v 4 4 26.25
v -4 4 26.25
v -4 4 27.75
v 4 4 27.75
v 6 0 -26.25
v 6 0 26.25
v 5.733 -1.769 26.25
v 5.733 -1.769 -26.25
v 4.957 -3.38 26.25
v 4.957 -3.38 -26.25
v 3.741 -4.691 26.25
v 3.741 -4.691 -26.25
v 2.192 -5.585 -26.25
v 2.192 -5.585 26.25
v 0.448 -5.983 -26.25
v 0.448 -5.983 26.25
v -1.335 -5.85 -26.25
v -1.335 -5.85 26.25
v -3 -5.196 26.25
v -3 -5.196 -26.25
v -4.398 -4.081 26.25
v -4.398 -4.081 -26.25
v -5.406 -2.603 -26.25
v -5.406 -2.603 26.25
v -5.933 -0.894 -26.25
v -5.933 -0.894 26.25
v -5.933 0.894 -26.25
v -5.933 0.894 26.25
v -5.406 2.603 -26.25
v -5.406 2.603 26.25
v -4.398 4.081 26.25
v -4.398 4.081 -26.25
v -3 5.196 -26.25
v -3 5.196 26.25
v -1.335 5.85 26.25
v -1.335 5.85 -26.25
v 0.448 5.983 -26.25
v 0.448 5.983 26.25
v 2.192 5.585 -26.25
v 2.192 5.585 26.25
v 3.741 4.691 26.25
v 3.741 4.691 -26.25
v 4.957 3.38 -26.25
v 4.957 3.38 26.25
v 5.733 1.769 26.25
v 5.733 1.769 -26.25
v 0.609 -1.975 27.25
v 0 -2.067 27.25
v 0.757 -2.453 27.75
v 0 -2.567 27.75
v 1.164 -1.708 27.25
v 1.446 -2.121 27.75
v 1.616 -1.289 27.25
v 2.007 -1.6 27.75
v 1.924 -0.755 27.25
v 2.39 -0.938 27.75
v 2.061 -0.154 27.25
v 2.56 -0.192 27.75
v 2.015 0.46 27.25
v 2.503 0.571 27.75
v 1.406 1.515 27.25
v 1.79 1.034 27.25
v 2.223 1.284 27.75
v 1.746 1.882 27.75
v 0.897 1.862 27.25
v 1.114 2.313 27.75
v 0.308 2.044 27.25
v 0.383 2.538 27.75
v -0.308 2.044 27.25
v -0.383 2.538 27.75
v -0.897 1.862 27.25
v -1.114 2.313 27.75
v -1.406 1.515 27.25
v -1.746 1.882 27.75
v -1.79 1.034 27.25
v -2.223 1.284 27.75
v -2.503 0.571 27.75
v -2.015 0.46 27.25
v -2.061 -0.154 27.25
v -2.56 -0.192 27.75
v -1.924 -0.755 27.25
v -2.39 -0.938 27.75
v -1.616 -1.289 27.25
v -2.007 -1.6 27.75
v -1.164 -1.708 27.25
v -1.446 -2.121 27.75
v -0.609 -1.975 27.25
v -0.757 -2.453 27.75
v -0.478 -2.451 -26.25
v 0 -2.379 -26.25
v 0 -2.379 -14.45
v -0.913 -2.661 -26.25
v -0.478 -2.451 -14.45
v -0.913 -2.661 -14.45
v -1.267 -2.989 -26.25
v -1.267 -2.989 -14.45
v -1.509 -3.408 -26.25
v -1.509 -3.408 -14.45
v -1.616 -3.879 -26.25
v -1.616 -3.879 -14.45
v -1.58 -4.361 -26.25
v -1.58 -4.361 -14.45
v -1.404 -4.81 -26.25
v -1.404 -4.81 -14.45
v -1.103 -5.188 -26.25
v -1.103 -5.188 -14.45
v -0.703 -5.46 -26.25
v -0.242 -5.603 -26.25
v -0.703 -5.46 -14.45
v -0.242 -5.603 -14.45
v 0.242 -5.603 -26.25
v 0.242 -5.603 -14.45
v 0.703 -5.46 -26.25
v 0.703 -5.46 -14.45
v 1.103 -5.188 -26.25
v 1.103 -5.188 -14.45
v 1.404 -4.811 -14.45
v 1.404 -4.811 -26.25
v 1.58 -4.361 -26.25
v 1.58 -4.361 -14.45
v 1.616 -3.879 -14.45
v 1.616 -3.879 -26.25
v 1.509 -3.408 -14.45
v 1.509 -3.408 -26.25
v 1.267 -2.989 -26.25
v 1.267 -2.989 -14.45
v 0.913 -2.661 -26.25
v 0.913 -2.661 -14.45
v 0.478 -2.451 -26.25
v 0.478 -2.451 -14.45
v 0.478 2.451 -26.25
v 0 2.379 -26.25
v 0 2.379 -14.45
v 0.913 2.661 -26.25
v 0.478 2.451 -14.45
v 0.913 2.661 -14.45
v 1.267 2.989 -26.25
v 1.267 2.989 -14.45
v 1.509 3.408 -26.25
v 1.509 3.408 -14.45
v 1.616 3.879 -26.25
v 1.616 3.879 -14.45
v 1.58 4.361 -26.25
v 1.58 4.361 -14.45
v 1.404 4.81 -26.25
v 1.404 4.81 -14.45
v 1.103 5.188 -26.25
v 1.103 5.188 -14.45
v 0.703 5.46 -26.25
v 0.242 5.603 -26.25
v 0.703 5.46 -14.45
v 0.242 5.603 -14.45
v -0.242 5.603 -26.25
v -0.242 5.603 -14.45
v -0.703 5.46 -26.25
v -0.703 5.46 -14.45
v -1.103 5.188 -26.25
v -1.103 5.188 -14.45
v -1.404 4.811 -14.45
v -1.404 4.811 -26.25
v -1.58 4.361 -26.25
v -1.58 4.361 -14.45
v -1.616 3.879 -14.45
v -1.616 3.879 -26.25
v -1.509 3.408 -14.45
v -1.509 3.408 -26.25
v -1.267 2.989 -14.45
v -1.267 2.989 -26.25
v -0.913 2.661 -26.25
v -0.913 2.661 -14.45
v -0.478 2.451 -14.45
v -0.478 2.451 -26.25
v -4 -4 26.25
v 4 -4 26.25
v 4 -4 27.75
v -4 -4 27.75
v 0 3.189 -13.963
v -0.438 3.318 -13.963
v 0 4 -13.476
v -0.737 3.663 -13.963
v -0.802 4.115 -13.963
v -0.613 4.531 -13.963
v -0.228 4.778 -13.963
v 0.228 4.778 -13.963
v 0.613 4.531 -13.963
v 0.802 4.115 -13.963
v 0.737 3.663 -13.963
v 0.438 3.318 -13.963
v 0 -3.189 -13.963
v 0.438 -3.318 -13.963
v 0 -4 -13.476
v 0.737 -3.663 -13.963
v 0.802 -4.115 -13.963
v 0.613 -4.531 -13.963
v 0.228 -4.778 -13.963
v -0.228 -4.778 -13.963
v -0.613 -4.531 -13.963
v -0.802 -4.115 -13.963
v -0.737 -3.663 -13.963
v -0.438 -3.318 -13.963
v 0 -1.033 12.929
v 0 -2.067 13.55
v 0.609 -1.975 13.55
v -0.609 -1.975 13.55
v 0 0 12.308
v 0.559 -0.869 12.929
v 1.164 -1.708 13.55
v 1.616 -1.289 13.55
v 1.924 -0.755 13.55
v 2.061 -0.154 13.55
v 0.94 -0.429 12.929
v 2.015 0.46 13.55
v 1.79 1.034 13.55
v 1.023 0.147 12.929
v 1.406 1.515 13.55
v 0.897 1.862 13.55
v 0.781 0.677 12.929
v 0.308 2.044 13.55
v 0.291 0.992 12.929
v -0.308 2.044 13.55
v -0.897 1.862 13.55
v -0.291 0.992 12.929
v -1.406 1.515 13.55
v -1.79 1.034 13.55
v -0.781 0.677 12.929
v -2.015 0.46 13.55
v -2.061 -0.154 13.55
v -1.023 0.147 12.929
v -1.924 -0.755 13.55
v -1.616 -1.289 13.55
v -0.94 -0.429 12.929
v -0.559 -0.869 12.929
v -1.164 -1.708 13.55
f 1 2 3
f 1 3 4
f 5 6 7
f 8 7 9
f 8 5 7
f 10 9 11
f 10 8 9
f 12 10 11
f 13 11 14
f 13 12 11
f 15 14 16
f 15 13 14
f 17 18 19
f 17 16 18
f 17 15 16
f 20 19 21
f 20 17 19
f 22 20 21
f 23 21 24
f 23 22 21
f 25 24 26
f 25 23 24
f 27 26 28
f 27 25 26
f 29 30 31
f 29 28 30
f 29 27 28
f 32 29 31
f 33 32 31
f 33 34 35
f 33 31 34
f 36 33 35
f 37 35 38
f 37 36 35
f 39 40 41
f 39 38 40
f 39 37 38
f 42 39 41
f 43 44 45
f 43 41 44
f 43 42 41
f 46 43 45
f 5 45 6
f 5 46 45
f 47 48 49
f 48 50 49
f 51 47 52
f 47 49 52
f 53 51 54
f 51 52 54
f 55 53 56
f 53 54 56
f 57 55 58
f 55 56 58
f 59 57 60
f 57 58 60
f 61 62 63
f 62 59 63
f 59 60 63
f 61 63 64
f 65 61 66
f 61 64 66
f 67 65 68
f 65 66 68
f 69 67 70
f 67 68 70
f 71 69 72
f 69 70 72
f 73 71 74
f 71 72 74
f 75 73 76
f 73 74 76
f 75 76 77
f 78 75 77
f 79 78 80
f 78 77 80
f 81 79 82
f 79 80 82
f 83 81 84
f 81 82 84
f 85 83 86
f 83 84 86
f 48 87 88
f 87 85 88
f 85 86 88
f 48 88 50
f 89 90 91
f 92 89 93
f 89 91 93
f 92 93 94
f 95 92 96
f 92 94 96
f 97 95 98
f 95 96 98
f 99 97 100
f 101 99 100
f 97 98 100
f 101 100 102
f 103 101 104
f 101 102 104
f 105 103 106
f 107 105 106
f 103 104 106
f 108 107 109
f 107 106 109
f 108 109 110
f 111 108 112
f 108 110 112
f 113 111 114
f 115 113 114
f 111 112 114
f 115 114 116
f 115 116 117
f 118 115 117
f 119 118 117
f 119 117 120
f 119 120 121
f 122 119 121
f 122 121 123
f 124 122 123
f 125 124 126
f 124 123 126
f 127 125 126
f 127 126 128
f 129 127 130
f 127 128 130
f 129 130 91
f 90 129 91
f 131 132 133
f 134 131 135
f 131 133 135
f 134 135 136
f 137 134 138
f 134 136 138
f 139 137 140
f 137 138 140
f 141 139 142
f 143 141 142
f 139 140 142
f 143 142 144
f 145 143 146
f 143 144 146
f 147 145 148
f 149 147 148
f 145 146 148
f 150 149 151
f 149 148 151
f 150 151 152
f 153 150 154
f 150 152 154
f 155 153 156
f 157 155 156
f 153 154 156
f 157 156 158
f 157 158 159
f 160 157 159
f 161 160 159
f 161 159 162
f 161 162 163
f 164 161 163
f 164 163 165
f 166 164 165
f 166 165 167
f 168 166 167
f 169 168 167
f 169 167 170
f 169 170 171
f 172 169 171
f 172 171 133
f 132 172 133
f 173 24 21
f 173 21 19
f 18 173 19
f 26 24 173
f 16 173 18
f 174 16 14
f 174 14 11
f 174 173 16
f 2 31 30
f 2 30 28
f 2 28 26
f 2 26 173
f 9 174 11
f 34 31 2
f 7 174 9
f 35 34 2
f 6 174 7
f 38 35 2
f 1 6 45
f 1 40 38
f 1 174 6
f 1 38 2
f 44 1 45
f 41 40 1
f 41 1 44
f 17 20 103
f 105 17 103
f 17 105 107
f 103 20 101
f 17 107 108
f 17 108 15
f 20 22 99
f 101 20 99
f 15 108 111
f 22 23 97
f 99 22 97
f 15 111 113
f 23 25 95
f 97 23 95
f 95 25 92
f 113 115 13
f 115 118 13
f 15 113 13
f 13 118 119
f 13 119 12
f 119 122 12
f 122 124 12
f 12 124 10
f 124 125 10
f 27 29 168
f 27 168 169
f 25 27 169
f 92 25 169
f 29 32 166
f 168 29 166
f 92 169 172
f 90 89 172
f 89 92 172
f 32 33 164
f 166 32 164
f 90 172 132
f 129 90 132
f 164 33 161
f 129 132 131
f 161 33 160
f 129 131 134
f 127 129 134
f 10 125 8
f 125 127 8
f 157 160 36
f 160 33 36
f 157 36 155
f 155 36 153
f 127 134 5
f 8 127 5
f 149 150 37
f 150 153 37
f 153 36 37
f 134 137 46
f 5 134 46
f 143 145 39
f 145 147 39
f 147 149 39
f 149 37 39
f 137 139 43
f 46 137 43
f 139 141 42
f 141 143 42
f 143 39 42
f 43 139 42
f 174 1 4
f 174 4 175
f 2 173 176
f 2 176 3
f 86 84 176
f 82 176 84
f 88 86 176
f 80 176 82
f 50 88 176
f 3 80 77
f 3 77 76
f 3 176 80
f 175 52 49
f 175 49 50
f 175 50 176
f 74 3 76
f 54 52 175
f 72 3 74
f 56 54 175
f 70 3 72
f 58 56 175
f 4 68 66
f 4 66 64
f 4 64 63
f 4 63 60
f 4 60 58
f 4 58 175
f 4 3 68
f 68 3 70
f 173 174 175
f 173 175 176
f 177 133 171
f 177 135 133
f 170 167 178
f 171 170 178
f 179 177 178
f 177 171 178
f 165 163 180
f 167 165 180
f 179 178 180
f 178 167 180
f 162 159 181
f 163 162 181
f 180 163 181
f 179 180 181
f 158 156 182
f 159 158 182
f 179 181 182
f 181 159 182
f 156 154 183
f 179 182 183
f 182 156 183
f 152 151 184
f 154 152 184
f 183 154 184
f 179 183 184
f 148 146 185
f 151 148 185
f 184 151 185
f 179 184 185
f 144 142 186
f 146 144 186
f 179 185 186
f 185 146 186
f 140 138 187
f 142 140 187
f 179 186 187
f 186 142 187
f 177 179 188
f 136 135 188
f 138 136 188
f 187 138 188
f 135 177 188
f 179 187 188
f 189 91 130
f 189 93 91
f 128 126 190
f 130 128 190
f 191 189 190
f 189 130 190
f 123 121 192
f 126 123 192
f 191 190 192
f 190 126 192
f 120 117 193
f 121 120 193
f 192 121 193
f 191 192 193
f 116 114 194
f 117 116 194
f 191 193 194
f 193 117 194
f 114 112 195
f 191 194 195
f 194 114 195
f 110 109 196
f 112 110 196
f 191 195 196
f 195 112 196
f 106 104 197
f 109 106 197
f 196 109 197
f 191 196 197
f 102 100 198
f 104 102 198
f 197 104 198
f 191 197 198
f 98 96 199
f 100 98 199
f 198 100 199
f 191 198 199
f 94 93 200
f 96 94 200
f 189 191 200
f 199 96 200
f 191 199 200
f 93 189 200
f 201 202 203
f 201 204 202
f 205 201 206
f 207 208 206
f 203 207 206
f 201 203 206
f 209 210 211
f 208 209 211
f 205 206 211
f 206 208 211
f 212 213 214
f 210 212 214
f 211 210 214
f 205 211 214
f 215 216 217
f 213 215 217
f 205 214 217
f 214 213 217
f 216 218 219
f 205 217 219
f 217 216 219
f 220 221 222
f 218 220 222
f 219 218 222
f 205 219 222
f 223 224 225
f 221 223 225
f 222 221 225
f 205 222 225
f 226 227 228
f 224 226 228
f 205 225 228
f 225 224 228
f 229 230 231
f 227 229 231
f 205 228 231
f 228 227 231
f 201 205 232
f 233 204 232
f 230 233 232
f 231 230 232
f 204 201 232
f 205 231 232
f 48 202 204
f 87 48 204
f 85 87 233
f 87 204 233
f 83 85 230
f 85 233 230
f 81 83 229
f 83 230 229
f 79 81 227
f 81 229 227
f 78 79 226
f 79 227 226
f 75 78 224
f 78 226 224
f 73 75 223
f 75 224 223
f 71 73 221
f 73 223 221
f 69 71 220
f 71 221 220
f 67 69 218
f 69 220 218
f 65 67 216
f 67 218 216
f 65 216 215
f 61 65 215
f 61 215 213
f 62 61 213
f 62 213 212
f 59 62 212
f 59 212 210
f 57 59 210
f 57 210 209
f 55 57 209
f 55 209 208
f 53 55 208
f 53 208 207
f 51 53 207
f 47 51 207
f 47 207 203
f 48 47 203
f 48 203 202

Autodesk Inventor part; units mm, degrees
ref_plane "YZ Plane" through (0, 0, 0) normal (1, 0, 0) x (0, 1, 0)
ref_plane "XZ Plane" through (0, 0, 0) normal (0, 1, 0) x (-1, 0, 0)
ref_plane "XY Plane" through (0, 0, 0) normal (0, 0, 1) x (1, 0, 0)
sketch "Sketch1" plane through (0, 0, 0) normal (0, 0, 1) x (1, 0, 0)
  circle A0 centre (0, 0) radius 6
  dimension "d0" = 12
extrude "Extrusion1" add sketch "Sketch1" along normal mid plane 52.5
sketch "Sketch2" plane through (0, 0, 26.25) normal (0, 0, 1) x (1, 0, 0)
  circle A0 centre (0, 0) radius 6
  line L0 (-4, 4) -> (4, 4)
  line L1 (4, 4) -> (4, -4)
  line L2 (4, -4) -> (-4, -4)
  line L3 (-4, -4) -> (-4, 4)
  line L4 (-4, 4) -> (4, -4) construction
  line L5 (4, 4) -> (-4, -4) construction
  dimension "d3" = 12
  dimension "d4" = 8
  dimension "d5" = 8
extrude "Extrusion2" add sketch "Sketch2" along normal blind 1.5 and the other way blind 34 contours L0 L1 L2 L3
sketch "Sketch6" plane through (0, 0, -26.25) normal (0, 0, -1) x (-1, 0, 0)
  circle A0 centre (0, -4) radius 1.5
  point P0 (0, 0)
  dimension "d28" = 3
  dimension "d29" = 4
hole "Hole2" at (0, -4, -26.25) direction (0, 0, 1) diameter 3.242 depth 11.8 tip angle 118 counterbore diameter 9 counterbore depth 0 thread size "M4x0.7" class "6H" standard "ISO Metric profile"
sketch "Sketch7" plane through (0, 0, -26.25) normal (0, 0, -1) x (-1, 0, 0)
  point P0 (0, 0)
pattern_circular "Circular Pattern1" count 2 over 360 about axis through (0, 0, 0) along (0, 0, 1) of "Hole2"
sketch "Sketch8" plane through (0, 0, 27.75) normal (0, 0, 1) x (1, 0, 0)
  circle A0 centre (0, 0) radius 1.2628
hole "Hole3" at (0, 0, 27.75) direction (0, 0, -1) diameter 4.134 depth 14.2 tip angle 118 thread size "M5x0.8" class "6H" standard "ISO Metric profile"
chamfer "Chamfer1" distance 0.5 angle 45 1 edges at (0, 2.067, 27.75)
properties part number "Joint1_Shaft"
